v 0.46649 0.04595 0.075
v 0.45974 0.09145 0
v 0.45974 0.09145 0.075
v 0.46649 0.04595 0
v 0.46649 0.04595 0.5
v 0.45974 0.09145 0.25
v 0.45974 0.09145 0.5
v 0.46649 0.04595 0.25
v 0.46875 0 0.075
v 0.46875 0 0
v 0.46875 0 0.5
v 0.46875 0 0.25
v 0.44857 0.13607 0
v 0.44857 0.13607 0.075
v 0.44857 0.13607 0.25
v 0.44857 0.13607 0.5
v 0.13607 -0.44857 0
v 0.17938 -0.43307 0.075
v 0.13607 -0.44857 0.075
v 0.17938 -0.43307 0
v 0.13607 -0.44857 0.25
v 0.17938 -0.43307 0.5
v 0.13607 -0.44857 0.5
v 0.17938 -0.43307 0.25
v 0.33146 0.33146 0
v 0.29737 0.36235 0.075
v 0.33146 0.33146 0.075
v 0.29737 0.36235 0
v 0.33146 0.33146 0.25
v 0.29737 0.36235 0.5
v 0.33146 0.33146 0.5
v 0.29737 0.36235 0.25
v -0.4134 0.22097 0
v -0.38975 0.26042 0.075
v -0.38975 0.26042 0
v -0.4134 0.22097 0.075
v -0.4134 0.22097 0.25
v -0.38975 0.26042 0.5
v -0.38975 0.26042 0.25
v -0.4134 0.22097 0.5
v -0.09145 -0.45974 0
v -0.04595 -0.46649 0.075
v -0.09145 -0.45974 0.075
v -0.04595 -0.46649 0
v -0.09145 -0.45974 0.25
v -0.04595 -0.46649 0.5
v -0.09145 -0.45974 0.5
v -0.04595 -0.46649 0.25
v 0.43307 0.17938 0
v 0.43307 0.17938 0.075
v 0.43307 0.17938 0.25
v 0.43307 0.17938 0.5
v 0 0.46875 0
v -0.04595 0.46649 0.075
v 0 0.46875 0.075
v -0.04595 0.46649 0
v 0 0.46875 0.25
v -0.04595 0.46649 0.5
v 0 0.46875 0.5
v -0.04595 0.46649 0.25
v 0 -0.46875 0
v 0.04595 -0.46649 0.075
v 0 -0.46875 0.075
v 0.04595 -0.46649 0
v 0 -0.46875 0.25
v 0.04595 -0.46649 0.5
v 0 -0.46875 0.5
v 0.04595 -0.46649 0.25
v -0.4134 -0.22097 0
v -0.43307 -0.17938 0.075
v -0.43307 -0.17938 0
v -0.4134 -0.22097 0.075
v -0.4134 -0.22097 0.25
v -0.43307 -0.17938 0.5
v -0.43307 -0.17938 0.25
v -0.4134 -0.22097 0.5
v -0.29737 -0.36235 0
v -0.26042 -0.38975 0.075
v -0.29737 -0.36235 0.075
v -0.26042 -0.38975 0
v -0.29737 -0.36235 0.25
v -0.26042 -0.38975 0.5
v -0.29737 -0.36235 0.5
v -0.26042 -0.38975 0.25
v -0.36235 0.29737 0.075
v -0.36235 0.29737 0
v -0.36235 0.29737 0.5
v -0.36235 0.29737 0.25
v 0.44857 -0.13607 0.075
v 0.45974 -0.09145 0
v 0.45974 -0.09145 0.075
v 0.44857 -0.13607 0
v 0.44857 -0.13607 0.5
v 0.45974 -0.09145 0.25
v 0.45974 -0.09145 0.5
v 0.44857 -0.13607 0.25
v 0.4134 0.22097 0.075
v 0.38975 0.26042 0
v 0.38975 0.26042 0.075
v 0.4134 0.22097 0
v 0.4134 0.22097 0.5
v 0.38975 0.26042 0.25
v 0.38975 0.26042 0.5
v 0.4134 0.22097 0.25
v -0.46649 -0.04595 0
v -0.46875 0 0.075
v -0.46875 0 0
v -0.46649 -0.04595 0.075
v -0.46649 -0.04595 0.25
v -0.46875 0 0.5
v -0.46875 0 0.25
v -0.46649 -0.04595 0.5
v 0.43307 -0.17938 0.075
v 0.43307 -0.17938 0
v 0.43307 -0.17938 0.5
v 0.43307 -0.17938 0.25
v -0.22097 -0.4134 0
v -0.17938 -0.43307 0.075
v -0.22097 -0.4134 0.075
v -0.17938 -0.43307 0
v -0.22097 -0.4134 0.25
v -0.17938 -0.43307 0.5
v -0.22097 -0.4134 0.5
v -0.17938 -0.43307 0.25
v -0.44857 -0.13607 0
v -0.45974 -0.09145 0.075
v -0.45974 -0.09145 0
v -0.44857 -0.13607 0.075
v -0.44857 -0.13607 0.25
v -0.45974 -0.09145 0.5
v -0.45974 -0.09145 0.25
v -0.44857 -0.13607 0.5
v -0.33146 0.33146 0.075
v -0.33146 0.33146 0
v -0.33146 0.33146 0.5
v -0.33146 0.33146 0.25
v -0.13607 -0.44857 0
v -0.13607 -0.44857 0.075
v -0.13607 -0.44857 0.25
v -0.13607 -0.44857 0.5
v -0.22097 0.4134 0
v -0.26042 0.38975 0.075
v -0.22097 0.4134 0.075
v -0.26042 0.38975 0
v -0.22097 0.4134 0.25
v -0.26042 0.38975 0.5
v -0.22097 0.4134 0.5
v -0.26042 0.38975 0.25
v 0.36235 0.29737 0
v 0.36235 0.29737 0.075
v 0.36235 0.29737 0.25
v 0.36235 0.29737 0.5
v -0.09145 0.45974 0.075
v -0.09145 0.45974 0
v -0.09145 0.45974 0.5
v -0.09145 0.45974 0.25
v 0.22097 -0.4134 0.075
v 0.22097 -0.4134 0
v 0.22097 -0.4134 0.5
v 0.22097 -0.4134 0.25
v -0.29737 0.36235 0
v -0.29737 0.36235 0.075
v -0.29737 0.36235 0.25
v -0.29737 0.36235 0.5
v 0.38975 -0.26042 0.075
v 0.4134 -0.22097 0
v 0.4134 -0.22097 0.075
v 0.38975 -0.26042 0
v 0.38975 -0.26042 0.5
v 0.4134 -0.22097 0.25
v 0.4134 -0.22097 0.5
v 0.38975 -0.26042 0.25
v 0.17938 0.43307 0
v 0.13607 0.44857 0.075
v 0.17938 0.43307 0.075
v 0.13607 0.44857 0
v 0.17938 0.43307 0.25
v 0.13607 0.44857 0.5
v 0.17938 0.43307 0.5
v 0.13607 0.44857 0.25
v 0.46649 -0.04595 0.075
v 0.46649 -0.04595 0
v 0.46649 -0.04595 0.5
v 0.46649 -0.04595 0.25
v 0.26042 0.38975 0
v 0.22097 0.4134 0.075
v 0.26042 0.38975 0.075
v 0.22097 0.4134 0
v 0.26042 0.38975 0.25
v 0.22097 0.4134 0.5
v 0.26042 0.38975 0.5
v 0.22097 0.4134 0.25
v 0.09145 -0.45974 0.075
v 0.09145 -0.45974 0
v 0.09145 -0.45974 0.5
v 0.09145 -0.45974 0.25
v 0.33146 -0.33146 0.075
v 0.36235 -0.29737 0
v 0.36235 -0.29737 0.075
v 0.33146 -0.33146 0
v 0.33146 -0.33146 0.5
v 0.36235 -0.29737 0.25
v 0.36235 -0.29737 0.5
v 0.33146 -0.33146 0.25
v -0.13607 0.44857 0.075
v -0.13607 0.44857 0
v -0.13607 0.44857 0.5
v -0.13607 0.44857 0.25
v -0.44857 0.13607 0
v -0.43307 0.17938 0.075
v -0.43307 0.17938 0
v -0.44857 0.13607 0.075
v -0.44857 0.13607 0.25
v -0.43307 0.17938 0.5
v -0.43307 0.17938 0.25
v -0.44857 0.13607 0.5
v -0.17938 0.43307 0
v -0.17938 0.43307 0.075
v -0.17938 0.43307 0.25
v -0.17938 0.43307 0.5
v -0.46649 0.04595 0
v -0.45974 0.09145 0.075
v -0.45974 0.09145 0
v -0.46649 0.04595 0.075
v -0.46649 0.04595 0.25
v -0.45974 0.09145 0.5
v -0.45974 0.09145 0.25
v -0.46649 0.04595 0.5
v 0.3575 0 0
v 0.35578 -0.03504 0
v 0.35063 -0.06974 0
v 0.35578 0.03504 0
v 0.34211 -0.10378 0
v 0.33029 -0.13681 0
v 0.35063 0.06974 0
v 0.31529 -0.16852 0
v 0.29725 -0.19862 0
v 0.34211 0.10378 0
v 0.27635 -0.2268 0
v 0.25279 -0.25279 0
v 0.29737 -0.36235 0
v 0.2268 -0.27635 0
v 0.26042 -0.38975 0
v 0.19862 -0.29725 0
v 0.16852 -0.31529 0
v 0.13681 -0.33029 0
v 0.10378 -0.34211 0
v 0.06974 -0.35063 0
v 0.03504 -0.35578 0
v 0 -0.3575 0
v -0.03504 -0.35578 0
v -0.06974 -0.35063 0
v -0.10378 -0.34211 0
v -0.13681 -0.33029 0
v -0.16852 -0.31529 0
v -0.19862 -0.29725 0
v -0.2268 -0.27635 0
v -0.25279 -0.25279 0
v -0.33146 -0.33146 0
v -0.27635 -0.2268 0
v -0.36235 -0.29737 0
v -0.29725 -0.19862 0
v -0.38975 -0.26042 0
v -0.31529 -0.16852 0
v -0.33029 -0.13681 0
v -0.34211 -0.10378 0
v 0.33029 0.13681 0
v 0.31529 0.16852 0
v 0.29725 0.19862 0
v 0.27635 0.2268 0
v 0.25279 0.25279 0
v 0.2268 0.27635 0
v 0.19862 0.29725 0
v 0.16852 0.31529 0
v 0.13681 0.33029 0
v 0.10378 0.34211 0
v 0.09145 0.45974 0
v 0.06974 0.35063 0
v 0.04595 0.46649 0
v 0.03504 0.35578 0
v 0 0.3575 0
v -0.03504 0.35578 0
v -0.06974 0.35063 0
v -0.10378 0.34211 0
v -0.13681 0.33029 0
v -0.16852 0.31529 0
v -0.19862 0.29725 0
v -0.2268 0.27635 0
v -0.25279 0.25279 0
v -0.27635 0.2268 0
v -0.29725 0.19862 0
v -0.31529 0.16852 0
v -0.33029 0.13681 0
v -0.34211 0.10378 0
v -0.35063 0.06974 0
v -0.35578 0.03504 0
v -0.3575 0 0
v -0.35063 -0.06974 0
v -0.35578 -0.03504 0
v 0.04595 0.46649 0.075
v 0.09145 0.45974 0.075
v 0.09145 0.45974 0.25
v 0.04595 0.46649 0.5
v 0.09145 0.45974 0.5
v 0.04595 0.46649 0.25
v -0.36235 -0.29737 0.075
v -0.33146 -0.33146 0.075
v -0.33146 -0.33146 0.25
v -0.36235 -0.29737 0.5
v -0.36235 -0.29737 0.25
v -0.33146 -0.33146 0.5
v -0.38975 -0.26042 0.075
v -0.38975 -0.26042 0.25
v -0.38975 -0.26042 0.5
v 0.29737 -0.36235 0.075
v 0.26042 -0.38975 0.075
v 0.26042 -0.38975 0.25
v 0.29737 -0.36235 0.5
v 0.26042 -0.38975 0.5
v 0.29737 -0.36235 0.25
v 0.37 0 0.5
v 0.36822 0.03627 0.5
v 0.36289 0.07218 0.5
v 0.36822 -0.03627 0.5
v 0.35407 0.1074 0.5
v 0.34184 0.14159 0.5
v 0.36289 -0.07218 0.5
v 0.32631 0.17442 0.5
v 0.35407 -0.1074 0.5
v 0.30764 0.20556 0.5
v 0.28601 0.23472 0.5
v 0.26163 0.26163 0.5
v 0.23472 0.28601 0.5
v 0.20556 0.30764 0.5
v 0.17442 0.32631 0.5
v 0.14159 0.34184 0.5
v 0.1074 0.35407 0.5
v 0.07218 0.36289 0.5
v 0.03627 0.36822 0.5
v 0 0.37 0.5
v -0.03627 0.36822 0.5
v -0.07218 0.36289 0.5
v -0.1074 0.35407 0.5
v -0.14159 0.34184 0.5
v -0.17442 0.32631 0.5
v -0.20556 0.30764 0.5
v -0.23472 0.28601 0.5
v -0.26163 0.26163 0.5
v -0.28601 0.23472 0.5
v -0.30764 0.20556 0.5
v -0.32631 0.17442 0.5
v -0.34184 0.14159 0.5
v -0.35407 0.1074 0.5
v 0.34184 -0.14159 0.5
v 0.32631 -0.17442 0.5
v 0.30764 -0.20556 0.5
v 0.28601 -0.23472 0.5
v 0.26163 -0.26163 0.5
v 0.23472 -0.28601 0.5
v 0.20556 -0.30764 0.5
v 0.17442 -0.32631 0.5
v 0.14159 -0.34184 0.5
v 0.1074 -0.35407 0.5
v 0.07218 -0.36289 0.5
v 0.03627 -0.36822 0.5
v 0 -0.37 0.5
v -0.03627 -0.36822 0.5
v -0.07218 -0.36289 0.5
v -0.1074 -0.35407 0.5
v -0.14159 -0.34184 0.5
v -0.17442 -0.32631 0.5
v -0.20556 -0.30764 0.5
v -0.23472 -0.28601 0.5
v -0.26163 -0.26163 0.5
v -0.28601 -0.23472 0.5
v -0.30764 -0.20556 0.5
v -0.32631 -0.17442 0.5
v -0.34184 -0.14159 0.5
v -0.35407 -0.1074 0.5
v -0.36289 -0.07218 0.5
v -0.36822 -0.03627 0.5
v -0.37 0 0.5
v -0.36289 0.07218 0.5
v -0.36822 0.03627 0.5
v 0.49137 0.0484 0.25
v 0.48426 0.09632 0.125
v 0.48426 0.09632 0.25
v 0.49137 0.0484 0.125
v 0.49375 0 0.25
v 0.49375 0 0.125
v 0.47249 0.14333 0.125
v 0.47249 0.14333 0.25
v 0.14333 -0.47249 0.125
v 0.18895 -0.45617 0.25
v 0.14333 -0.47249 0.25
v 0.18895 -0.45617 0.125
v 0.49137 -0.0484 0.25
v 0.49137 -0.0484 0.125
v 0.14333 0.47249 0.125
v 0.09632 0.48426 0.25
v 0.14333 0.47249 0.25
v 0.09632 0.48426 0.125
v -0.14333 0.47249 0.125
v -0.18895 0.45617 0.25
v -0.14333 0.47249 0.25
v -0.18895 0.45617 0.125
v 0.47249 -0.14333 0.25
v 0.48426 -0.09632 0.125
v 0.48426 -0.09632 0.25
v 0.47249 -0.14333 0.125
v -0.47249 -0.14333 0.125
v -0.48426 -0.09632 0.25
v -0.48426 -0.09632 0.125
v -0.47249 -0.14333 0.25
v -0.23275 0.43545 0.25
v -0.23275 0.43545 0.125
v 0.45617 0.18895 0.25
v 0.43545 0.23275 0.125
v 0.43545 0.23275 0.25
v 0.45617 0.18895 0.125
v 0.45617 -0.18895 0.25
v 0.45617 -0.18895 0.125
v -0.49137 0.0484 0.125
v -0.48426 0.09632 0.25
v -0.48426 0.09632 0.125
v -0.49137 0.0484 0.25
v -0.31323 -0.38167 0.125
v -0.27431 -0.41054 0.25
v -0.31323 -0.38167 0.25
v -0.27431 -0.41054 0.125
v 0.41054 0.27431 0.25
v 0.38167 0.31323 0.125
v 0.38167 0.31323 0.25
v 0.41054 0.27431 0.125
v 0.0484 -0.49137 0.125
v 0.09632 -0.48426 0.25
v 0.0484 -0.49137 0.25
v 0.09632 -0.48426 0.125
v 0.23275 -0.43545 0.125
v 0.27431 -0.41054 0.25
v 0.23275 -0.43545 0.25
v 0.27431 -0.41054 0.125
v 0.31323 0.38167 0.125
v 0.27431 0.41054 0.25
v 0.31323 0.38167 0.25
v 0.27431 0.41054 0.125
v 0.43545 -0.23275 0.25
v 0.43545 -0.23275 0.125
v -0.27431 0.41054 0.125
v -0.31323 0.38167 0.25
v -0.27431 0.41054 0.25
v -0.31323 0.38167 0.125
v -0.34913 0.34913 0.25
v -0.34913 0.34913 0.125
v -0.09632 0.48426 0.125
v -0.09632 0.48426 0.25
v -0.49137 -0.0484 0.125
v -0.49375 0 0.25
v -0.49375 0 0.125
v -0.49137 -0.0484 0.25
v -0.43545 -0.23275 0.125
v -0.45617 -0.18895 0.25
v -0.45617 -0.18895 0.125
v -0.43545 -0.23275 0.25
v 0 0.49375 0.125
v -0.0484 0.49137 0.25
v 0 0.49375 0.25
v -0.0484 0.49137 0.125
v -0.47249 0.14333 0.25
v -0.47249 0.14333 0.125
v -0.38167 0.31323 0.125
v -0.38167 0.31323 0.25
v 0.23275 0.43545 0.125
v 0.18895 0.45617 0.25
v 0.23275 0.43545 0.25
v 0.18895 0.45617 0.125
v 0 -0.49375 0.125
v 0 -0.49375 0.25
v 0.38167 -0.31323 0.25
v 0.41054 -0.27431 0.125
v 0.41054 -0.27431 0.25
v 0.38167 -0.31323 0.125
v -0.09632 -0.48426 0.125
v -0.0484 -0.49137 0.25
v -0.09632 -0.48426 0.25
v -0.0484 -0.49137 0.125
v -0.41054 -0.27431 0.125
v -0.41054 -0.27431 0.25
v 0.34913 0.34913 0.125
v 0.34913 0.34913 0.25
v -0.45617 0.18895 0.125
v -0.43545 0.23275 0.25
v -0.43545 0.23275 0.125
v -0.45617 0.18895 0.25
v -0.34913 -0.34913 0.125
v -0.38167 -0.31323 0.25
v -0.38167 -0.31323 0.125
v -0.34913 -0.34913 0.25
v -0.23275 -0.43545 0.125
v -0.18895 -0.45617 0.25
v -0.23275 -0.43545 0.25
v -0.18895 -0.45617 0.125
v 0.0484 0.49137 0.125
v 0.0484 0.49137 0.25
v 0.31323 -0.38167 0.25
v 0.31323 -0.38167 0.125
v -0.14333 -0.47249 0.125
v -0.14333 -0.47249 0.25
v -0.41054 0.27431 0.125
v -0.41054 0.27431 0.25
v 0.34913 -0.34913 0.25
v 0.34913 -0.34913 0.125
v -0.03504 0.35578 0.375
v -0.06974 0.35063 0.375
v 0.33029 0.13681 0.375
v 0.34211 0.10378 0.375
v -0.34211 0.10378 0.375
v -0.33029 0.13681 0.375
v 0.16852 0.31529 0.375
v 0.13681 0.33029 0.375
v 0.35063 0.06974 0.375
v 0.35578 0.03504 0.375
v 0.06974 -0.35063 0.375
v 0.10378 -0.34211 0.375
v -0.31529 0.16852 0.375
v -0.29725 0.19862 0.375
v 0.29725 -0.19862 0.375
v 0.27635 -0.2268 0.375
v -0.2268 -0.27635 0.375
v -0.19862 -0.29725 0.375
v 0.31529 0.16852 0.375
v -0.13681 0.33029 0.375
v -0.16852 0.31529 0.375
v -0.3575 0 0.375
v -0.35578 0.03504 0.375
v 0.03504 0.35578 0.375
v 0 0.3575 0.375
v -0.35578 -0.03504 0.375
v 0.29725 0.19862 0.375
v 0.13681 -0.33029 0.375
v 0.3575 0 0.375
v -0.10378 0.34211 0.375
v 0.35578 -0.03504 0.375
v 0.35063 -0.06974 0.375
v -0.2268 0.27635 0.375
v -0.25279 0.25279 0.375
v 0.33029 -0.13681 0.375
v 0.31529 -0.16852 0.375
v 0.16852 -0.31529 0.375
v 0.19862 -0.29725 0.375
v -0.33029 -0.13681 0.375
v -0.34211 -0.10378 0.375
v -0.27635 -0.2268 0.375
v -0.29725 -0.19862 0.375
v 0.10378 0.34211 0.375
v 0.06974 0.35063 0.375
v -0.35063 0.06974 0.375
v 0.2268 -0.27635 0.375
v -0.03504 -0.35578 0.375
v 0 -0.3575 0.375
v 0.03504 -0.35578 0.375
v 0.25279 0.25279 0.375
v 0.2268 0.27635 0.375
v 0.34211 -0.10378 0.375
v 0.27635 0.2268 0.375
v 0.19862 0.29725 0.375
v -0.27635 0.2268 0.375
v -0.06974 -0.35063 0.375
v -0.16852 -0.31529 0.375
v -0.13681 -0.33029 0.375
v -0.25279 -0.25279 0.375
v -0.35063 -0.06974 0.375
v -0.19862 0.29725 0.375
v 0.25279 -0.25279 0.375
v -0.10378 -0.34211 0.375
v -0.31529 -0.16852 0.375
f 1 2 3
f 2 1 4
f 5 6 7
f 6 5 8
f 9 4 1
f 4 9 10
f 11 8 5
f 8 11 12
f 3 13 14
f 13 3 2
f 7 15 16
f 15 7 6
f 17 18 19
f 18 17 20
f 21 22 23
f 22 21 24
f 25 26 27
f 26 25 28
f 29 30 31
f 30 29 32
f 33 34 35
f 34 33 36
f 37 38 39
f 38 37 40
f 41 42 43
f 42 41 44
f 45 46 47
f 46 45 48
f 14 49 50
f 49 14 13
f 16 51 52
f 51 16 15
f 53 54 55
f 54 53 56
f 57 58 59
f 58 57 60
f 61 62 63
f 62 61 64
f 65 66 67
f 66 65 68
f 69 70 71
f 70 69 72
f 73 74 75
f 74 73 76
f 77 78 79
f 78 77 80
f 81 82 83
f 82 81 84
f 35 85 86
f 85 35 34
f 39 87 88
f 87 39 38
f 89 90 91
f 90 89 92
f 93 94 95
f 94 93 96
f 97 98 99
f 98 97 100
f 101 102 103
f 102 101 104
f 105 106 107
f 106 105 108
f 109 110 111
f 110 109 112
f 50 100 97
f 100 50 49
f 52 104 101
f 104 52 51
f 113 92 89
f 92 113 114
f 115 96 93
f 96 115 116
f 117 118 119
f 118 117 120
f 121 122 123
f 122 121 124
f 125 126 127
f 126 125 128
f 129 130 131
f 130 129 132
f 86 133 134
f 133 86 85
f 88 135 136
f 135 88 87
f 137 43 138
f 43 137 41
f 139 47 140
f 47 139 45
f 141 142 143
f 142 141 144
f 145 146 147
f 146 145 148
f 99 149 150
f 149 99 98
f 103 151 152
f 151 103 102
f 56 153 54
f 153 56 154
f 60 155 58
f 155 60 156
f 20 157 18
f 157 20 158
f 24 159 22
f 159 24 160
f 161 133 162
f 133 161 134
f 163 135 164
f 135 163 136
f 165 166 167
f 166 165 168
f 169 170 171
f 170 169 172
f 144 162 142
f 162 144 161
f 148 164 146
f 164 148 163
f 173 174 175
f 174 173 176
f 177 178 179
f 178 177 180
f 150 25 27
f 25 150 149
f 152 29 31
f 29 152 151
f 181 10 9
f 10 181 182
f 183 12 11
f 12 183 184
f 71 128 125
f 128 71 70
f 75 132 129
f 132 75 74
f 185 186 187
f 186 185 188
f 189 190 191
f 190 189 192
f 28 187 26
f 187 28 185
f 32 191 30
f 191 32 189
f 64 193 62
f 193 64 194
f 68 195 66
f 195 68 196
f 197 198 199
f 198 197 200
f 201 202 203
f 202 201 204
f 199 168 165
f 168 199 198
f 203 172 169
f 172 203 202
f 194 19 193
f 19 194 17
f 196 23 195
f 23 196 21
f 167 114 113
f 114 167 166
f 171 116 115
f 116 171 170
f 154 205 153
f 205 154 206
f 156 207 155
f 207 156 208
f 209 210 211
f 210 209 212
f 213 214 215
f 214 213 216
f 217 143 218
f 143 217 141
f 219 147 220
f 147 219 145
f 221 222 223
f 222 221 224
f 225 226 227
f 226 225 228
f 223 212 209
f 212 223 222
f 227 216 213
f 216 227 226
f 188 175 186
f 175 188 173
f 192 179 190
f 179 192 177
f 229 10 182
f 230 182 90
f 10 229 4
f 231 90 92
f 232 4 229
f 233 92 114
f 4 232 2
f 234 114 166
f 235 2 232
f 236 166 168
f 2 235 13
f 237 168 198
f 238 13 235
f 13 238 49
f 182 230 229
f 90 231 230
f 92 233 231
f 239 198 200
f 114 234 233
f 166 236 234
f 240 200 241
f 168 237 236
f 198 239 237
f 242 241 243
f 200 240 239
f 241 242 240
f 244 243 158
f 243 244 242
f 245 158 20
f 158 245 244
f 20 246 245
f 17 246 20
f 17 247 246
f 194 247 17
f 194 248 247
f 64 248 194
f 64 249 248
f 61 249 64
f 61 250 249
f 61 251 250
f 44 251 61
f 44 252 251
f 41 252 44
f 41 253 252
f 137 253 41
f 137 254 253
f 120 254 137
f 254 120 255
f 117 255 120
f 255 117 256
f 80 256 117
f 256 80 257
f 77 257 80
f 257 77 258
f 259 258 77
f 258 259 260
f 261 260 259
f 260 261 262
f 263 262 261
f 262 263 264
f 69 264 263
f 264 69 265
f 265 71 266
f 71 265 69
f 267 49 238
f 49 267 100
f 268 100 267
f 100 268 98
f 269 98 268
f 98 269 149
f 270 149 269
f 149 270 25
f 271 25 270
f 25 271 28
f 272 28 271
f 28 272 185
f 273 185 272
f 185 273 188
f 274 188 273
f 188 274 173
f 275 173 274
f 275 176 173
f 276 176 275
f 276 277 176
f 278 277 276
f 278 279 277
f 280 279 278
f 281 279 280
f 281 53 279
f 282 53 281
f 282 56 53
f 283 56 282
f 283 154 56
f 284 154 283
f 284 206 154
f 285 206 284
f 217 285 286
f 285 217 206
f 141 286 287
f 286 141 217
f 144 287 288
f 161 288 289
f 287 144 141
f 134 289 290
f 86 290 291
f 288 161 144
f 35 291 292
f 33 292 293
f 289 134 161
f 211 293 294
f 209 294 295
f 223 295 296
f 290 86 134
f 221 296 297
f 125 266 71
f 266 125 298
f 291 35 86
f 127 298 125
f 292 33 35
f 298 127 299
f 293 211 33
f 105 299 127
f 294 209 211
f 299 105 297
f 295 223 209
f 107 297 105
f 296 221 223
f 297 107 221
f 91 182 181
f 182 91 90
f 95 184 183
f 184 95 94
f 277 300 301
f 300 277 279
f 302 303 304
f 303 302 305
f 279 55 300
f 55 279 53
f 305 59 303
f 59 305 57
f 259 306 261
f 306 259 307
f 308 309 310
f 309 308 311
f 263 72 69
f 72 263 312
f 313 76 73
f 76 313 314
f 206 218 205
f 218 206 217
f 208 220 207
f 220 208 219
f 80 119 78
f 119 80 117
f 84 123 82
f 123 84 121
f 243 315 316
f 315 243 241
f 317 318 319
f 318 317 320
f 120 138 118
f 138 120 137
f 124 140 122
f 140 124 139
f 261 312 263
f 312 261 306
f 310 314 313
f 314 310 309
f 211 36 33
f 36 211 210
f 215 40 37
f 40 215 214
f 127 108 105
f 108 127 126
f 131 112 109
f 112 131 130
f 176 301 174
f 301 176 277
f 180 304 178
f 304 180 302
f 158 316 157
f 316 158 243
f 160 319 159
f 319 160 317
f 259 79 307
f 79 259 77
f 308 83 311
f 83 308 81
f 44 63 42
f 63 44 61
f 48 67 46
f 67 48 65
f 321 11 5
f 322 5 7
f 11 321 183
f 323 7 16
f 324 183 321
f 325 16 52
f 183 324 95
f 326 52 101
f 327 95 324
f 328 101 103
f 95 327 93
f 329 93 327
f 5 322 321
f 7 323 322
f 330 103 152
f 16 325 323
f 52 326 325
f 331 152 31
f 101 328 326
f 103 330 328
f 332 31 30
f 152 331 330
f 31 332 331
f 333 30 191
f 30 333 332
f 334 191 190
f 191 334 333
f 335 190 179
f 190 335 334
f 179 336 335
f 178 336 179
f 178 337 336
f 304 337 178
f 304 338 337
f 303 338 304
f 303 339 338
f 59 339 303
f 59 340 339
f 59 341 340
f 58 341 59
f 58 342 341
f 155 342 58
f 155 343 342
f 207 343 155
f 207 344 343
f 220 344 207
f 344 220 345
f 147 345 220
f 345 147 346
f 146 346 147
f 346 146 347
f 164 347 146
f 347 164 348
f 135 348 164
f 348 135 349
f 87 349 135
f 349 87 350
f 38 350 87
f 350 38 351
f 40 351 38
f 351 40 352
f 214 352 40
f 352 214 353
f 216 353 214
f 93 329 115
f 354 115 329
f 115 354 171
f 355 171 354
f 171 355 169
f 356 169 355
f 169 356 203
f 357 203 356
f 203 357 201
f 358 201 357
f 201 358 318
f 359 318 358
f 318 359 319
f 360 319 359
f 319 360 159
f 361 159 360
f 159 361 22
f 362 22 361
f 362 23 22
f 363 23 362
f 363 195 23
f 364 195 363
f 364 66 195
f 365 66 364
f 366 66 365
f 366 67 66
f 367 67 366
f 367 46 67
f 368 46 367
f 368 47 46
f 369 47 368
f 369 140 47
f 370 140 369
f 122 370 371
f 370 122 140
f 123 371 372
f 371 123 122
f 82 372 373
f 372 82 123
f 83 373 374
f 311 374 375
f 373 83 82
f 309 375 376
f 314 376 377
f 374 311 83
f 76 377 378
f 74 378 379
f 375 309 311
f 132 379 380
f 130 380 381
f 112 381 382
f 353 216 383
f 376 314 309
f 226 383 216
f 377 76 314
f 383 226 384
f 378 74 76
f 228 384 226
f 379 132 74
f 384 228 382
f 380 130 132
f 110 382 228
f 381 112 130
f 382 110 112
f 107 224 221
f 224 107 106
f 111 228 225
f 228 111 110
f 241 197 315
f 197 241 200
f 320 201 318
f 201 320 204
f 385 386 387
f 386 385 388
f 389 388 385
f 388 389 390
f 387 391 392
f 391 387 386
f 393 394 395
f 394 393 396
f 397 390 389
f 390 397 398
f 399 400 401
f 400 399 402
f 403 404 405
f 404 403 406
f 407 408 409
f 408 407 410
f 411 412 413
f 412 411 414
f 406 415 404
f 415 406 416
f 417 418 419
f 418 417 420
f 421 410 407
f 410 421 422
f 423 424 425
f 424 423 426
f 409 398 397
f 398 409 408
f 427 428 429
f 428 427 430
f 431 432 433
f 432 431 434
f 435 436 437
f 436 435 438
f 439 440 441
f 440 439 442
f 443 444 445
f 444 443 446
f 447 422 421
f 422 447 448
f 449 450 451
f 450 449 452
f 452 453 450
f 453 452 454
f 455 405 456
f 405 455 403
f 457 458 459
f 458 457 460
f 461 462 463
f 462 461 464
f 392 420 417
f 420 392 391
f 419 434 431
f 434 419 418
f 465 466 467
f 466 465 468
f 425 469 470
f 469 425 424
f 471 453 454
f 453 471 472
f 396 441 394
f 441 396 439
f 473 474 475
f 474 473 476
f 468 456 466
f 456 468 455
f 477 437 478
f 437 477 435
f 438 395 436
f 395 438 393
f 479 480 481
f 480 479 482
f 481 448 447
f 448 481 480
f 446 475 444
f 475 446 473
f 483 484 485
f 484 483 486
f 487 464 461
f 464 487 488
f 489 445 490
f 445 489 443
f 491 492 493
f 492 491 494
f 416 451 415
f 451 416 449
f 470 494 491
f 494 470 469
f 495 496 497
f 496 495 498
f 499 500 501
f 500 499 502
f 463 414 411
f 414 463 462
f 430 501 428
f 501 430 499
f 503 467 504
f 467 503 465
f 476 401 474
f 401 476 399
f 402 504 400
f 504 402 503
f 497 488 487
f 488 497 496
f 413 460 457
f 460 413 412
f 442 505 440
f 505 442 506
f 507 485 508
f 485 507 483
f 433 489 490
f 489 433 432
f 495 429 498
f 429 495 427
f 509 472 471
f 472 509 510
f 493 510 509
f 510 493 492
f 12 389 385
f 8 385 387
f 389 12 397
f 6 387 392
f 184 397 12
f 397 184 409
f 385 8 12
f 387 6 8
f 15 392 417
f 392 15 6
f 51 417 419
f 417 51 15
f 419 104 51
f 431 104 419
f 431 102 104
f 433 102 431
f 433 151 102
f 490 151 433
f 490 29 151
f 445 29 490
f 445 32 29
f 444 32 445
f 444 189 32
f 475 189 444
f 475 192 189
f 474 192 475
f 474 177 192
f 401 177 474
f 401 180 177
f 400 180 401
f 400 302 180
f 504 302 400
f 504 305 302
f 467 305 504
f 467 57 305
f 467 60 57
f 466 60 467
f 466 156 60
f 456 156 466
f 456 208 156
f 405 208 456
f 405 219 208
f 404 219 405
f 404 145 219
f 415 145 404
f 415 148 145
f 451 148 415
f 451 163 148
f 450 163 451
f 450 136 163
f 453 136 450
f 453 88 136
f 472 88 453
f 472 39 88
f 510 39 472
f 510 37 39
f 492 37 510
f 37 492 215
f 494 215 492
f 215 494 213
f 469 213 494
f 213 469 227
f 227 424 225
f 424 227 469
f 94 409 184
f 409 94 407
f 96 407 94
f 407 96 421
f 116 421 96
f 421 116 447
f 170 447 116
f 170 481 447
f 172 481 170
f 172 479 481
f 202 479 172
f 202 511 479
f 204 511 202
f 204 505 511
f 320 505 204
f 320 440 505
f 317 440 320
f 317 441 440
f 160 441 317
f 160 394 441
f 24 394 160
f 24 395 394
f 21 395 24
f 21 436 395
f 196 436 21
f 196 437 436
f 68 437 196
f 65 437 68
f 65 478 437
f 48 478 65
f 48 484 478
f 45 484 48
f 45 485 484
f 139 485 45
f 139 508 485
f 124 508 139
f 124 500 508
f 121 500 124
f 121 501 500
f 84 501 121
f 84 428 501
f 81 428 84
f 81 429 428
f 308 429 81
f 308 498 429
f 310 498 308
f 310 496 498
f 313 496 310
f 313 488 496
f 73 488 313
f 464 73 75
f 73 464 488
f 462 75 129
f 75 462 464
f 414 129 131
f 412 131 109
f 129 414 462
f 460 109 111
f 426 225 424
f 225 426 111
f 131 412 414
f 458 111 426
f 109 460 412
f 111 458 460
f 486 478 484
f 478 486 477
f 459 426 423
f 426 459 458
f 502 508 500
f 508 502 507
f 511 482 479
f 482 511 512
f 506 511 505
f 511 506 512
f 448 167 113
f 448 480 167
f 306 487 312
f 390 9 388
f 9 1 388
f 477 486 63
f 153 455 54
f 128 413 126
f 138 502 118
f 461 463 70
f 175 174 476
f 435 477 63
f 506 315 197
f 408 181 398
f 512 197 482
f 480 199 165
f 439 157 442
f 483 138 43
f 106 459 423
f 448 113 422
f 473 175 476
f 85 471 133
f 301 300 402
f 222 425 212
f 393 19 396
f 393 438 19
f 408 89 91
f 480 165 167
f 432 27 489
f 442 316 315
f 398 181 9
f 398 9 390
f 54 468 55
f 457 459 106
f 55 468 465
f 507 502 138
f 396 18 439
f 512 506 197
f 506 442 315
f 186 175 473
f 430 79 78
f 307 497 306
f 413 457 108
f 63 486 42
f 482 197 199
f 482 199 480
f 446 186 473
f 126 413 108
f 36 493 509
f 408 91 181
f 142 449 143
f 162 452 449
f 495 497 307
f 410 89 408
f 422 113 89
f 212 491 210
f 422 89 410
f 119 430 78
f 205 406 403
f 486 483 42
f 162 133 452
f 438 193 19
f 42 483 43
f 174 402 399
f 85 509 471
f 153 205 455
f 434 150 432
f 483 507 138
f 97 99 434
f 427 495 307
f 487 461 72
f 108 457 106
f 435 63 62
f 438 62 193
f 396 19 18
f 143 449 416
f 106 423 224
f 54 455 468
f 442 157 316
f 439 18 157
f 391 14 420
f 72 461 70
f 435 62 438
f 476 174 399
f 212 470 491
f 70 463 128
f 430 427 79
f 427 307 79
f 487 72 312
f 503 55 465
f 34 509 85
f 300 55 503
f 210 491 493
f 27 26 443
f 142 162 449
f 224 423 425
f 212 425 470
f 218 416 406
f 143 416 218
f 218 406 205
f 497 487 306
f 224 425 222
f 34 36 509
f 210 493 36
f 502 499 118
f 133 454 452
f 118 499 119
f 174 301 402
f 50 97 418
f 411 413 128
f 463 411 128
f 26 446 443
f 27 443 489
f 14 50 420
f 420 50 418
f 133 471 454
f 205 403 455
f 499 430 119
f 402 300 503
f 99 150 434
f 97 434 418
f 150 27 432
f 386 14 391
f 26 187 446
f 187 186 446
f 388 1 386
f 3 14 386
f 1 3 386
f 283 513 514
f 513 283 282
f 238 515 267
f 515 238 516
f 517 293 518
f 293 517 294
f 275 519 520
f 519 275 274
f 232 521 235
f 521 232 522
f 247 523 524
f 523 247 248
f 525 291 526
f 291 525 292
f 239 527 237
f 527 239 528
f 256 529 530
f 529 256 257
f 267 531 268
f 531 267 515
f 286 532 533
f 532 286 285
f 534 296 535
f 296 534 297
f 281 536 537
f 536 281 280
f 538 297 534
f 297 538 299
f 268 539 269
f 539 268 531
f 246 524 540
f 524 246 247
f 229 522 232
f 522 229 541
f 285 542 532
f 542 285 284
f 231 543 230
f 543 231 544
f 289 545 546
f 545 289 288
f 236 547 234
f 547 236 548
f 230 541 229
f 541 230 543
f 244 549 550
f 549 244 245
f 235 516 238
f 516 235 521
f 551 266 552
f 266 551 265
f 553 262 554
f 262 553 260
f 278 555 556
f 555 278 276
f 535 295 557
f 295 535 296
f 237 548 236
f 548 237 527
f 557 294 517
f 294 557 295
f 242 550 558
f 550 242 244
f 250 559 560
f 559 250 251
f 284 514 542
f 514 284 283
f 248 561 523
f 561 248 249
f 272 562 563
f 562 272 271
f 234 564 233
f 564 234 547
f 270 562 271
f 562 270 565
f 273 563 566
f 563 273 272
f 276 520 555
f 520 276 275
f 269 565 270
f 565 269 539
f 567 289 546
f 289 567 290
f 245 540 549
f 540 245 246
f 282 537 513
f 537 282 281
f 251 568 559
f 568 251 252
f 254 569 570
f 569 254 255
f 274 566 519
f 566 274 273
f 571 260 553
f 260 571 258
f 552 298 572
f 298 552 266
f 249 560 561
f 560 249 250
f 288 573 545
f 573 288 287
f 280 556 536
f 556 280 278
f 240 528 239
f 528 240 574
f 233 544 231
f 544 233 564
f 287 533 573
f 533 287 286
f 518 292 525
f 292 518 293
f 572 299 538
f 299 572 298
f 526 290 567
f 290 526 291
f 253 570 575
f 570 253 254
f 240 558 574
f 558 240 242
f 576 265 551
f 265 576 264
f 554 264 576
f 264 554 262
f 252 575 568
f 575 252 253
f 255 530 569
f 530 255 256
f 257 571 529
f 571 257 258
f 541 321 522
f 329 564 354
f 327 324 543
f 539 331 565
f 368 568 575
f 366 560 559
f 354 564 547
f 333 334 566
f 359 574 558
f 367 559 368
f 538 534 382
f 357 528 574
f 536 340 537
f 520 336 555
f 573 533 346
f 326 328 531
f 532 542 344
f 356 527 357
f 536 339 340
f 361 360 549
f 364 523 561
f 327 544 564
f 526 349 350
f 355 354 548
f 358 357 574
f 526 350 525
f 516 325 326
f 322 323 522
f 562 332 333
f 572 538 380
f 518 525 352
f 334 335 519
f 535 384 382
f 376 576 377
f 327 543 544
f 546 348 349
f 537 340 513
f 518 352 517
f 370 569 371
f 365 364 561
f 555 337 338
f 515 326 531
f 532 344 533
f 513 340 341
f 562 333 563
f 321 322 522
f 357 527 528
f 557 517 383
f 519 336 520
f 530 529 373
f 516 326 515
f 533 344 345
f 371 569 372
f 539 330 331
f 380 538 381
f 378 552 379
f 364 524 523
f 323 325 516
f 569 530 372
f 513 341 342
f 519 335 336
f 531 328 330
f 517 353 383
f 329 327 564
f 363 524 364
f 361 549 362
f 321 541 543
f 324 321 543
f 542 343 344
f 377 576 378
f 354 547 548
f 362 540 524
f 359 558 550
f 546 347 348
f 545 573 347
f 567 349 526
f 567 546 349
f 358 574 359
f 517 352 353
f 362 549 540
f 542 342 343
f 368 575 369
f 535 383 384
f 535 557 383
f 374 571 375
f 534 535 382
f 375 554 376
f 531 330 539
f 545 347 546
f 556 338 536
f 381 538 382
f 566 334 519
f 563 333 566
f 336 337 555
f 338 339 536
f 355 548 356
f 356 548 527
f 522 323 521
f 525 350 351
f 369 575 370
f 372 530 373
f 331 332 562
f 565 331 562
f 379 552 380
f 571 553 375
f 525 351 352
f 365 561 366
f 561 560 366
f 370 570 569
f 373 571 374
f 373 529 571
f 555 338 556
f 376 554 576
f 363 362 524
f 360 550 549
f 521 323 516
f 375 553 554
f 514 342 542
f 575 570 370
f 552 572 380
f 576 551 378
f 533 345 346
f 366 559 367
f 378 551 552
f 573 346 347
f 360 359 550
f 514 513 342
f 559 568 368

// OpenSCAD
$fn=64;

module bic_belted_collar(bic_diameter, adapter_diameter, adapter_height) {
    difference() {
        union () {
            // body
            cylinder(r=adapter_diameter/2, h=adapter_height+1/8);

            // outer belt
            belt_diameter=adapter_diameter+0.050;
            translate([0, 0, adapter_height/2])
                    cylinder(r=belt_diameter/2, h=1/8, center=true);

            // overhang chamfer
            translate([0, 0, adapter_height/2 - (1/16 + 0.025)])
                cylinder(r1=adapter_diameter/2, r2=belt_diameter/2, h=0.050, center=true);
        }

        // inside
        cylinder(r=bic_diameter/2, h=adapter_height);

        // interior taper
        translate([0, 0, adapter_height])
            cylinder(r1=bic_diameter/2, r2=(bic_diameter+0.025)/2, h=1/8);
    }
}

bic_belted_collar(0.715, 15/16, 3/8);
